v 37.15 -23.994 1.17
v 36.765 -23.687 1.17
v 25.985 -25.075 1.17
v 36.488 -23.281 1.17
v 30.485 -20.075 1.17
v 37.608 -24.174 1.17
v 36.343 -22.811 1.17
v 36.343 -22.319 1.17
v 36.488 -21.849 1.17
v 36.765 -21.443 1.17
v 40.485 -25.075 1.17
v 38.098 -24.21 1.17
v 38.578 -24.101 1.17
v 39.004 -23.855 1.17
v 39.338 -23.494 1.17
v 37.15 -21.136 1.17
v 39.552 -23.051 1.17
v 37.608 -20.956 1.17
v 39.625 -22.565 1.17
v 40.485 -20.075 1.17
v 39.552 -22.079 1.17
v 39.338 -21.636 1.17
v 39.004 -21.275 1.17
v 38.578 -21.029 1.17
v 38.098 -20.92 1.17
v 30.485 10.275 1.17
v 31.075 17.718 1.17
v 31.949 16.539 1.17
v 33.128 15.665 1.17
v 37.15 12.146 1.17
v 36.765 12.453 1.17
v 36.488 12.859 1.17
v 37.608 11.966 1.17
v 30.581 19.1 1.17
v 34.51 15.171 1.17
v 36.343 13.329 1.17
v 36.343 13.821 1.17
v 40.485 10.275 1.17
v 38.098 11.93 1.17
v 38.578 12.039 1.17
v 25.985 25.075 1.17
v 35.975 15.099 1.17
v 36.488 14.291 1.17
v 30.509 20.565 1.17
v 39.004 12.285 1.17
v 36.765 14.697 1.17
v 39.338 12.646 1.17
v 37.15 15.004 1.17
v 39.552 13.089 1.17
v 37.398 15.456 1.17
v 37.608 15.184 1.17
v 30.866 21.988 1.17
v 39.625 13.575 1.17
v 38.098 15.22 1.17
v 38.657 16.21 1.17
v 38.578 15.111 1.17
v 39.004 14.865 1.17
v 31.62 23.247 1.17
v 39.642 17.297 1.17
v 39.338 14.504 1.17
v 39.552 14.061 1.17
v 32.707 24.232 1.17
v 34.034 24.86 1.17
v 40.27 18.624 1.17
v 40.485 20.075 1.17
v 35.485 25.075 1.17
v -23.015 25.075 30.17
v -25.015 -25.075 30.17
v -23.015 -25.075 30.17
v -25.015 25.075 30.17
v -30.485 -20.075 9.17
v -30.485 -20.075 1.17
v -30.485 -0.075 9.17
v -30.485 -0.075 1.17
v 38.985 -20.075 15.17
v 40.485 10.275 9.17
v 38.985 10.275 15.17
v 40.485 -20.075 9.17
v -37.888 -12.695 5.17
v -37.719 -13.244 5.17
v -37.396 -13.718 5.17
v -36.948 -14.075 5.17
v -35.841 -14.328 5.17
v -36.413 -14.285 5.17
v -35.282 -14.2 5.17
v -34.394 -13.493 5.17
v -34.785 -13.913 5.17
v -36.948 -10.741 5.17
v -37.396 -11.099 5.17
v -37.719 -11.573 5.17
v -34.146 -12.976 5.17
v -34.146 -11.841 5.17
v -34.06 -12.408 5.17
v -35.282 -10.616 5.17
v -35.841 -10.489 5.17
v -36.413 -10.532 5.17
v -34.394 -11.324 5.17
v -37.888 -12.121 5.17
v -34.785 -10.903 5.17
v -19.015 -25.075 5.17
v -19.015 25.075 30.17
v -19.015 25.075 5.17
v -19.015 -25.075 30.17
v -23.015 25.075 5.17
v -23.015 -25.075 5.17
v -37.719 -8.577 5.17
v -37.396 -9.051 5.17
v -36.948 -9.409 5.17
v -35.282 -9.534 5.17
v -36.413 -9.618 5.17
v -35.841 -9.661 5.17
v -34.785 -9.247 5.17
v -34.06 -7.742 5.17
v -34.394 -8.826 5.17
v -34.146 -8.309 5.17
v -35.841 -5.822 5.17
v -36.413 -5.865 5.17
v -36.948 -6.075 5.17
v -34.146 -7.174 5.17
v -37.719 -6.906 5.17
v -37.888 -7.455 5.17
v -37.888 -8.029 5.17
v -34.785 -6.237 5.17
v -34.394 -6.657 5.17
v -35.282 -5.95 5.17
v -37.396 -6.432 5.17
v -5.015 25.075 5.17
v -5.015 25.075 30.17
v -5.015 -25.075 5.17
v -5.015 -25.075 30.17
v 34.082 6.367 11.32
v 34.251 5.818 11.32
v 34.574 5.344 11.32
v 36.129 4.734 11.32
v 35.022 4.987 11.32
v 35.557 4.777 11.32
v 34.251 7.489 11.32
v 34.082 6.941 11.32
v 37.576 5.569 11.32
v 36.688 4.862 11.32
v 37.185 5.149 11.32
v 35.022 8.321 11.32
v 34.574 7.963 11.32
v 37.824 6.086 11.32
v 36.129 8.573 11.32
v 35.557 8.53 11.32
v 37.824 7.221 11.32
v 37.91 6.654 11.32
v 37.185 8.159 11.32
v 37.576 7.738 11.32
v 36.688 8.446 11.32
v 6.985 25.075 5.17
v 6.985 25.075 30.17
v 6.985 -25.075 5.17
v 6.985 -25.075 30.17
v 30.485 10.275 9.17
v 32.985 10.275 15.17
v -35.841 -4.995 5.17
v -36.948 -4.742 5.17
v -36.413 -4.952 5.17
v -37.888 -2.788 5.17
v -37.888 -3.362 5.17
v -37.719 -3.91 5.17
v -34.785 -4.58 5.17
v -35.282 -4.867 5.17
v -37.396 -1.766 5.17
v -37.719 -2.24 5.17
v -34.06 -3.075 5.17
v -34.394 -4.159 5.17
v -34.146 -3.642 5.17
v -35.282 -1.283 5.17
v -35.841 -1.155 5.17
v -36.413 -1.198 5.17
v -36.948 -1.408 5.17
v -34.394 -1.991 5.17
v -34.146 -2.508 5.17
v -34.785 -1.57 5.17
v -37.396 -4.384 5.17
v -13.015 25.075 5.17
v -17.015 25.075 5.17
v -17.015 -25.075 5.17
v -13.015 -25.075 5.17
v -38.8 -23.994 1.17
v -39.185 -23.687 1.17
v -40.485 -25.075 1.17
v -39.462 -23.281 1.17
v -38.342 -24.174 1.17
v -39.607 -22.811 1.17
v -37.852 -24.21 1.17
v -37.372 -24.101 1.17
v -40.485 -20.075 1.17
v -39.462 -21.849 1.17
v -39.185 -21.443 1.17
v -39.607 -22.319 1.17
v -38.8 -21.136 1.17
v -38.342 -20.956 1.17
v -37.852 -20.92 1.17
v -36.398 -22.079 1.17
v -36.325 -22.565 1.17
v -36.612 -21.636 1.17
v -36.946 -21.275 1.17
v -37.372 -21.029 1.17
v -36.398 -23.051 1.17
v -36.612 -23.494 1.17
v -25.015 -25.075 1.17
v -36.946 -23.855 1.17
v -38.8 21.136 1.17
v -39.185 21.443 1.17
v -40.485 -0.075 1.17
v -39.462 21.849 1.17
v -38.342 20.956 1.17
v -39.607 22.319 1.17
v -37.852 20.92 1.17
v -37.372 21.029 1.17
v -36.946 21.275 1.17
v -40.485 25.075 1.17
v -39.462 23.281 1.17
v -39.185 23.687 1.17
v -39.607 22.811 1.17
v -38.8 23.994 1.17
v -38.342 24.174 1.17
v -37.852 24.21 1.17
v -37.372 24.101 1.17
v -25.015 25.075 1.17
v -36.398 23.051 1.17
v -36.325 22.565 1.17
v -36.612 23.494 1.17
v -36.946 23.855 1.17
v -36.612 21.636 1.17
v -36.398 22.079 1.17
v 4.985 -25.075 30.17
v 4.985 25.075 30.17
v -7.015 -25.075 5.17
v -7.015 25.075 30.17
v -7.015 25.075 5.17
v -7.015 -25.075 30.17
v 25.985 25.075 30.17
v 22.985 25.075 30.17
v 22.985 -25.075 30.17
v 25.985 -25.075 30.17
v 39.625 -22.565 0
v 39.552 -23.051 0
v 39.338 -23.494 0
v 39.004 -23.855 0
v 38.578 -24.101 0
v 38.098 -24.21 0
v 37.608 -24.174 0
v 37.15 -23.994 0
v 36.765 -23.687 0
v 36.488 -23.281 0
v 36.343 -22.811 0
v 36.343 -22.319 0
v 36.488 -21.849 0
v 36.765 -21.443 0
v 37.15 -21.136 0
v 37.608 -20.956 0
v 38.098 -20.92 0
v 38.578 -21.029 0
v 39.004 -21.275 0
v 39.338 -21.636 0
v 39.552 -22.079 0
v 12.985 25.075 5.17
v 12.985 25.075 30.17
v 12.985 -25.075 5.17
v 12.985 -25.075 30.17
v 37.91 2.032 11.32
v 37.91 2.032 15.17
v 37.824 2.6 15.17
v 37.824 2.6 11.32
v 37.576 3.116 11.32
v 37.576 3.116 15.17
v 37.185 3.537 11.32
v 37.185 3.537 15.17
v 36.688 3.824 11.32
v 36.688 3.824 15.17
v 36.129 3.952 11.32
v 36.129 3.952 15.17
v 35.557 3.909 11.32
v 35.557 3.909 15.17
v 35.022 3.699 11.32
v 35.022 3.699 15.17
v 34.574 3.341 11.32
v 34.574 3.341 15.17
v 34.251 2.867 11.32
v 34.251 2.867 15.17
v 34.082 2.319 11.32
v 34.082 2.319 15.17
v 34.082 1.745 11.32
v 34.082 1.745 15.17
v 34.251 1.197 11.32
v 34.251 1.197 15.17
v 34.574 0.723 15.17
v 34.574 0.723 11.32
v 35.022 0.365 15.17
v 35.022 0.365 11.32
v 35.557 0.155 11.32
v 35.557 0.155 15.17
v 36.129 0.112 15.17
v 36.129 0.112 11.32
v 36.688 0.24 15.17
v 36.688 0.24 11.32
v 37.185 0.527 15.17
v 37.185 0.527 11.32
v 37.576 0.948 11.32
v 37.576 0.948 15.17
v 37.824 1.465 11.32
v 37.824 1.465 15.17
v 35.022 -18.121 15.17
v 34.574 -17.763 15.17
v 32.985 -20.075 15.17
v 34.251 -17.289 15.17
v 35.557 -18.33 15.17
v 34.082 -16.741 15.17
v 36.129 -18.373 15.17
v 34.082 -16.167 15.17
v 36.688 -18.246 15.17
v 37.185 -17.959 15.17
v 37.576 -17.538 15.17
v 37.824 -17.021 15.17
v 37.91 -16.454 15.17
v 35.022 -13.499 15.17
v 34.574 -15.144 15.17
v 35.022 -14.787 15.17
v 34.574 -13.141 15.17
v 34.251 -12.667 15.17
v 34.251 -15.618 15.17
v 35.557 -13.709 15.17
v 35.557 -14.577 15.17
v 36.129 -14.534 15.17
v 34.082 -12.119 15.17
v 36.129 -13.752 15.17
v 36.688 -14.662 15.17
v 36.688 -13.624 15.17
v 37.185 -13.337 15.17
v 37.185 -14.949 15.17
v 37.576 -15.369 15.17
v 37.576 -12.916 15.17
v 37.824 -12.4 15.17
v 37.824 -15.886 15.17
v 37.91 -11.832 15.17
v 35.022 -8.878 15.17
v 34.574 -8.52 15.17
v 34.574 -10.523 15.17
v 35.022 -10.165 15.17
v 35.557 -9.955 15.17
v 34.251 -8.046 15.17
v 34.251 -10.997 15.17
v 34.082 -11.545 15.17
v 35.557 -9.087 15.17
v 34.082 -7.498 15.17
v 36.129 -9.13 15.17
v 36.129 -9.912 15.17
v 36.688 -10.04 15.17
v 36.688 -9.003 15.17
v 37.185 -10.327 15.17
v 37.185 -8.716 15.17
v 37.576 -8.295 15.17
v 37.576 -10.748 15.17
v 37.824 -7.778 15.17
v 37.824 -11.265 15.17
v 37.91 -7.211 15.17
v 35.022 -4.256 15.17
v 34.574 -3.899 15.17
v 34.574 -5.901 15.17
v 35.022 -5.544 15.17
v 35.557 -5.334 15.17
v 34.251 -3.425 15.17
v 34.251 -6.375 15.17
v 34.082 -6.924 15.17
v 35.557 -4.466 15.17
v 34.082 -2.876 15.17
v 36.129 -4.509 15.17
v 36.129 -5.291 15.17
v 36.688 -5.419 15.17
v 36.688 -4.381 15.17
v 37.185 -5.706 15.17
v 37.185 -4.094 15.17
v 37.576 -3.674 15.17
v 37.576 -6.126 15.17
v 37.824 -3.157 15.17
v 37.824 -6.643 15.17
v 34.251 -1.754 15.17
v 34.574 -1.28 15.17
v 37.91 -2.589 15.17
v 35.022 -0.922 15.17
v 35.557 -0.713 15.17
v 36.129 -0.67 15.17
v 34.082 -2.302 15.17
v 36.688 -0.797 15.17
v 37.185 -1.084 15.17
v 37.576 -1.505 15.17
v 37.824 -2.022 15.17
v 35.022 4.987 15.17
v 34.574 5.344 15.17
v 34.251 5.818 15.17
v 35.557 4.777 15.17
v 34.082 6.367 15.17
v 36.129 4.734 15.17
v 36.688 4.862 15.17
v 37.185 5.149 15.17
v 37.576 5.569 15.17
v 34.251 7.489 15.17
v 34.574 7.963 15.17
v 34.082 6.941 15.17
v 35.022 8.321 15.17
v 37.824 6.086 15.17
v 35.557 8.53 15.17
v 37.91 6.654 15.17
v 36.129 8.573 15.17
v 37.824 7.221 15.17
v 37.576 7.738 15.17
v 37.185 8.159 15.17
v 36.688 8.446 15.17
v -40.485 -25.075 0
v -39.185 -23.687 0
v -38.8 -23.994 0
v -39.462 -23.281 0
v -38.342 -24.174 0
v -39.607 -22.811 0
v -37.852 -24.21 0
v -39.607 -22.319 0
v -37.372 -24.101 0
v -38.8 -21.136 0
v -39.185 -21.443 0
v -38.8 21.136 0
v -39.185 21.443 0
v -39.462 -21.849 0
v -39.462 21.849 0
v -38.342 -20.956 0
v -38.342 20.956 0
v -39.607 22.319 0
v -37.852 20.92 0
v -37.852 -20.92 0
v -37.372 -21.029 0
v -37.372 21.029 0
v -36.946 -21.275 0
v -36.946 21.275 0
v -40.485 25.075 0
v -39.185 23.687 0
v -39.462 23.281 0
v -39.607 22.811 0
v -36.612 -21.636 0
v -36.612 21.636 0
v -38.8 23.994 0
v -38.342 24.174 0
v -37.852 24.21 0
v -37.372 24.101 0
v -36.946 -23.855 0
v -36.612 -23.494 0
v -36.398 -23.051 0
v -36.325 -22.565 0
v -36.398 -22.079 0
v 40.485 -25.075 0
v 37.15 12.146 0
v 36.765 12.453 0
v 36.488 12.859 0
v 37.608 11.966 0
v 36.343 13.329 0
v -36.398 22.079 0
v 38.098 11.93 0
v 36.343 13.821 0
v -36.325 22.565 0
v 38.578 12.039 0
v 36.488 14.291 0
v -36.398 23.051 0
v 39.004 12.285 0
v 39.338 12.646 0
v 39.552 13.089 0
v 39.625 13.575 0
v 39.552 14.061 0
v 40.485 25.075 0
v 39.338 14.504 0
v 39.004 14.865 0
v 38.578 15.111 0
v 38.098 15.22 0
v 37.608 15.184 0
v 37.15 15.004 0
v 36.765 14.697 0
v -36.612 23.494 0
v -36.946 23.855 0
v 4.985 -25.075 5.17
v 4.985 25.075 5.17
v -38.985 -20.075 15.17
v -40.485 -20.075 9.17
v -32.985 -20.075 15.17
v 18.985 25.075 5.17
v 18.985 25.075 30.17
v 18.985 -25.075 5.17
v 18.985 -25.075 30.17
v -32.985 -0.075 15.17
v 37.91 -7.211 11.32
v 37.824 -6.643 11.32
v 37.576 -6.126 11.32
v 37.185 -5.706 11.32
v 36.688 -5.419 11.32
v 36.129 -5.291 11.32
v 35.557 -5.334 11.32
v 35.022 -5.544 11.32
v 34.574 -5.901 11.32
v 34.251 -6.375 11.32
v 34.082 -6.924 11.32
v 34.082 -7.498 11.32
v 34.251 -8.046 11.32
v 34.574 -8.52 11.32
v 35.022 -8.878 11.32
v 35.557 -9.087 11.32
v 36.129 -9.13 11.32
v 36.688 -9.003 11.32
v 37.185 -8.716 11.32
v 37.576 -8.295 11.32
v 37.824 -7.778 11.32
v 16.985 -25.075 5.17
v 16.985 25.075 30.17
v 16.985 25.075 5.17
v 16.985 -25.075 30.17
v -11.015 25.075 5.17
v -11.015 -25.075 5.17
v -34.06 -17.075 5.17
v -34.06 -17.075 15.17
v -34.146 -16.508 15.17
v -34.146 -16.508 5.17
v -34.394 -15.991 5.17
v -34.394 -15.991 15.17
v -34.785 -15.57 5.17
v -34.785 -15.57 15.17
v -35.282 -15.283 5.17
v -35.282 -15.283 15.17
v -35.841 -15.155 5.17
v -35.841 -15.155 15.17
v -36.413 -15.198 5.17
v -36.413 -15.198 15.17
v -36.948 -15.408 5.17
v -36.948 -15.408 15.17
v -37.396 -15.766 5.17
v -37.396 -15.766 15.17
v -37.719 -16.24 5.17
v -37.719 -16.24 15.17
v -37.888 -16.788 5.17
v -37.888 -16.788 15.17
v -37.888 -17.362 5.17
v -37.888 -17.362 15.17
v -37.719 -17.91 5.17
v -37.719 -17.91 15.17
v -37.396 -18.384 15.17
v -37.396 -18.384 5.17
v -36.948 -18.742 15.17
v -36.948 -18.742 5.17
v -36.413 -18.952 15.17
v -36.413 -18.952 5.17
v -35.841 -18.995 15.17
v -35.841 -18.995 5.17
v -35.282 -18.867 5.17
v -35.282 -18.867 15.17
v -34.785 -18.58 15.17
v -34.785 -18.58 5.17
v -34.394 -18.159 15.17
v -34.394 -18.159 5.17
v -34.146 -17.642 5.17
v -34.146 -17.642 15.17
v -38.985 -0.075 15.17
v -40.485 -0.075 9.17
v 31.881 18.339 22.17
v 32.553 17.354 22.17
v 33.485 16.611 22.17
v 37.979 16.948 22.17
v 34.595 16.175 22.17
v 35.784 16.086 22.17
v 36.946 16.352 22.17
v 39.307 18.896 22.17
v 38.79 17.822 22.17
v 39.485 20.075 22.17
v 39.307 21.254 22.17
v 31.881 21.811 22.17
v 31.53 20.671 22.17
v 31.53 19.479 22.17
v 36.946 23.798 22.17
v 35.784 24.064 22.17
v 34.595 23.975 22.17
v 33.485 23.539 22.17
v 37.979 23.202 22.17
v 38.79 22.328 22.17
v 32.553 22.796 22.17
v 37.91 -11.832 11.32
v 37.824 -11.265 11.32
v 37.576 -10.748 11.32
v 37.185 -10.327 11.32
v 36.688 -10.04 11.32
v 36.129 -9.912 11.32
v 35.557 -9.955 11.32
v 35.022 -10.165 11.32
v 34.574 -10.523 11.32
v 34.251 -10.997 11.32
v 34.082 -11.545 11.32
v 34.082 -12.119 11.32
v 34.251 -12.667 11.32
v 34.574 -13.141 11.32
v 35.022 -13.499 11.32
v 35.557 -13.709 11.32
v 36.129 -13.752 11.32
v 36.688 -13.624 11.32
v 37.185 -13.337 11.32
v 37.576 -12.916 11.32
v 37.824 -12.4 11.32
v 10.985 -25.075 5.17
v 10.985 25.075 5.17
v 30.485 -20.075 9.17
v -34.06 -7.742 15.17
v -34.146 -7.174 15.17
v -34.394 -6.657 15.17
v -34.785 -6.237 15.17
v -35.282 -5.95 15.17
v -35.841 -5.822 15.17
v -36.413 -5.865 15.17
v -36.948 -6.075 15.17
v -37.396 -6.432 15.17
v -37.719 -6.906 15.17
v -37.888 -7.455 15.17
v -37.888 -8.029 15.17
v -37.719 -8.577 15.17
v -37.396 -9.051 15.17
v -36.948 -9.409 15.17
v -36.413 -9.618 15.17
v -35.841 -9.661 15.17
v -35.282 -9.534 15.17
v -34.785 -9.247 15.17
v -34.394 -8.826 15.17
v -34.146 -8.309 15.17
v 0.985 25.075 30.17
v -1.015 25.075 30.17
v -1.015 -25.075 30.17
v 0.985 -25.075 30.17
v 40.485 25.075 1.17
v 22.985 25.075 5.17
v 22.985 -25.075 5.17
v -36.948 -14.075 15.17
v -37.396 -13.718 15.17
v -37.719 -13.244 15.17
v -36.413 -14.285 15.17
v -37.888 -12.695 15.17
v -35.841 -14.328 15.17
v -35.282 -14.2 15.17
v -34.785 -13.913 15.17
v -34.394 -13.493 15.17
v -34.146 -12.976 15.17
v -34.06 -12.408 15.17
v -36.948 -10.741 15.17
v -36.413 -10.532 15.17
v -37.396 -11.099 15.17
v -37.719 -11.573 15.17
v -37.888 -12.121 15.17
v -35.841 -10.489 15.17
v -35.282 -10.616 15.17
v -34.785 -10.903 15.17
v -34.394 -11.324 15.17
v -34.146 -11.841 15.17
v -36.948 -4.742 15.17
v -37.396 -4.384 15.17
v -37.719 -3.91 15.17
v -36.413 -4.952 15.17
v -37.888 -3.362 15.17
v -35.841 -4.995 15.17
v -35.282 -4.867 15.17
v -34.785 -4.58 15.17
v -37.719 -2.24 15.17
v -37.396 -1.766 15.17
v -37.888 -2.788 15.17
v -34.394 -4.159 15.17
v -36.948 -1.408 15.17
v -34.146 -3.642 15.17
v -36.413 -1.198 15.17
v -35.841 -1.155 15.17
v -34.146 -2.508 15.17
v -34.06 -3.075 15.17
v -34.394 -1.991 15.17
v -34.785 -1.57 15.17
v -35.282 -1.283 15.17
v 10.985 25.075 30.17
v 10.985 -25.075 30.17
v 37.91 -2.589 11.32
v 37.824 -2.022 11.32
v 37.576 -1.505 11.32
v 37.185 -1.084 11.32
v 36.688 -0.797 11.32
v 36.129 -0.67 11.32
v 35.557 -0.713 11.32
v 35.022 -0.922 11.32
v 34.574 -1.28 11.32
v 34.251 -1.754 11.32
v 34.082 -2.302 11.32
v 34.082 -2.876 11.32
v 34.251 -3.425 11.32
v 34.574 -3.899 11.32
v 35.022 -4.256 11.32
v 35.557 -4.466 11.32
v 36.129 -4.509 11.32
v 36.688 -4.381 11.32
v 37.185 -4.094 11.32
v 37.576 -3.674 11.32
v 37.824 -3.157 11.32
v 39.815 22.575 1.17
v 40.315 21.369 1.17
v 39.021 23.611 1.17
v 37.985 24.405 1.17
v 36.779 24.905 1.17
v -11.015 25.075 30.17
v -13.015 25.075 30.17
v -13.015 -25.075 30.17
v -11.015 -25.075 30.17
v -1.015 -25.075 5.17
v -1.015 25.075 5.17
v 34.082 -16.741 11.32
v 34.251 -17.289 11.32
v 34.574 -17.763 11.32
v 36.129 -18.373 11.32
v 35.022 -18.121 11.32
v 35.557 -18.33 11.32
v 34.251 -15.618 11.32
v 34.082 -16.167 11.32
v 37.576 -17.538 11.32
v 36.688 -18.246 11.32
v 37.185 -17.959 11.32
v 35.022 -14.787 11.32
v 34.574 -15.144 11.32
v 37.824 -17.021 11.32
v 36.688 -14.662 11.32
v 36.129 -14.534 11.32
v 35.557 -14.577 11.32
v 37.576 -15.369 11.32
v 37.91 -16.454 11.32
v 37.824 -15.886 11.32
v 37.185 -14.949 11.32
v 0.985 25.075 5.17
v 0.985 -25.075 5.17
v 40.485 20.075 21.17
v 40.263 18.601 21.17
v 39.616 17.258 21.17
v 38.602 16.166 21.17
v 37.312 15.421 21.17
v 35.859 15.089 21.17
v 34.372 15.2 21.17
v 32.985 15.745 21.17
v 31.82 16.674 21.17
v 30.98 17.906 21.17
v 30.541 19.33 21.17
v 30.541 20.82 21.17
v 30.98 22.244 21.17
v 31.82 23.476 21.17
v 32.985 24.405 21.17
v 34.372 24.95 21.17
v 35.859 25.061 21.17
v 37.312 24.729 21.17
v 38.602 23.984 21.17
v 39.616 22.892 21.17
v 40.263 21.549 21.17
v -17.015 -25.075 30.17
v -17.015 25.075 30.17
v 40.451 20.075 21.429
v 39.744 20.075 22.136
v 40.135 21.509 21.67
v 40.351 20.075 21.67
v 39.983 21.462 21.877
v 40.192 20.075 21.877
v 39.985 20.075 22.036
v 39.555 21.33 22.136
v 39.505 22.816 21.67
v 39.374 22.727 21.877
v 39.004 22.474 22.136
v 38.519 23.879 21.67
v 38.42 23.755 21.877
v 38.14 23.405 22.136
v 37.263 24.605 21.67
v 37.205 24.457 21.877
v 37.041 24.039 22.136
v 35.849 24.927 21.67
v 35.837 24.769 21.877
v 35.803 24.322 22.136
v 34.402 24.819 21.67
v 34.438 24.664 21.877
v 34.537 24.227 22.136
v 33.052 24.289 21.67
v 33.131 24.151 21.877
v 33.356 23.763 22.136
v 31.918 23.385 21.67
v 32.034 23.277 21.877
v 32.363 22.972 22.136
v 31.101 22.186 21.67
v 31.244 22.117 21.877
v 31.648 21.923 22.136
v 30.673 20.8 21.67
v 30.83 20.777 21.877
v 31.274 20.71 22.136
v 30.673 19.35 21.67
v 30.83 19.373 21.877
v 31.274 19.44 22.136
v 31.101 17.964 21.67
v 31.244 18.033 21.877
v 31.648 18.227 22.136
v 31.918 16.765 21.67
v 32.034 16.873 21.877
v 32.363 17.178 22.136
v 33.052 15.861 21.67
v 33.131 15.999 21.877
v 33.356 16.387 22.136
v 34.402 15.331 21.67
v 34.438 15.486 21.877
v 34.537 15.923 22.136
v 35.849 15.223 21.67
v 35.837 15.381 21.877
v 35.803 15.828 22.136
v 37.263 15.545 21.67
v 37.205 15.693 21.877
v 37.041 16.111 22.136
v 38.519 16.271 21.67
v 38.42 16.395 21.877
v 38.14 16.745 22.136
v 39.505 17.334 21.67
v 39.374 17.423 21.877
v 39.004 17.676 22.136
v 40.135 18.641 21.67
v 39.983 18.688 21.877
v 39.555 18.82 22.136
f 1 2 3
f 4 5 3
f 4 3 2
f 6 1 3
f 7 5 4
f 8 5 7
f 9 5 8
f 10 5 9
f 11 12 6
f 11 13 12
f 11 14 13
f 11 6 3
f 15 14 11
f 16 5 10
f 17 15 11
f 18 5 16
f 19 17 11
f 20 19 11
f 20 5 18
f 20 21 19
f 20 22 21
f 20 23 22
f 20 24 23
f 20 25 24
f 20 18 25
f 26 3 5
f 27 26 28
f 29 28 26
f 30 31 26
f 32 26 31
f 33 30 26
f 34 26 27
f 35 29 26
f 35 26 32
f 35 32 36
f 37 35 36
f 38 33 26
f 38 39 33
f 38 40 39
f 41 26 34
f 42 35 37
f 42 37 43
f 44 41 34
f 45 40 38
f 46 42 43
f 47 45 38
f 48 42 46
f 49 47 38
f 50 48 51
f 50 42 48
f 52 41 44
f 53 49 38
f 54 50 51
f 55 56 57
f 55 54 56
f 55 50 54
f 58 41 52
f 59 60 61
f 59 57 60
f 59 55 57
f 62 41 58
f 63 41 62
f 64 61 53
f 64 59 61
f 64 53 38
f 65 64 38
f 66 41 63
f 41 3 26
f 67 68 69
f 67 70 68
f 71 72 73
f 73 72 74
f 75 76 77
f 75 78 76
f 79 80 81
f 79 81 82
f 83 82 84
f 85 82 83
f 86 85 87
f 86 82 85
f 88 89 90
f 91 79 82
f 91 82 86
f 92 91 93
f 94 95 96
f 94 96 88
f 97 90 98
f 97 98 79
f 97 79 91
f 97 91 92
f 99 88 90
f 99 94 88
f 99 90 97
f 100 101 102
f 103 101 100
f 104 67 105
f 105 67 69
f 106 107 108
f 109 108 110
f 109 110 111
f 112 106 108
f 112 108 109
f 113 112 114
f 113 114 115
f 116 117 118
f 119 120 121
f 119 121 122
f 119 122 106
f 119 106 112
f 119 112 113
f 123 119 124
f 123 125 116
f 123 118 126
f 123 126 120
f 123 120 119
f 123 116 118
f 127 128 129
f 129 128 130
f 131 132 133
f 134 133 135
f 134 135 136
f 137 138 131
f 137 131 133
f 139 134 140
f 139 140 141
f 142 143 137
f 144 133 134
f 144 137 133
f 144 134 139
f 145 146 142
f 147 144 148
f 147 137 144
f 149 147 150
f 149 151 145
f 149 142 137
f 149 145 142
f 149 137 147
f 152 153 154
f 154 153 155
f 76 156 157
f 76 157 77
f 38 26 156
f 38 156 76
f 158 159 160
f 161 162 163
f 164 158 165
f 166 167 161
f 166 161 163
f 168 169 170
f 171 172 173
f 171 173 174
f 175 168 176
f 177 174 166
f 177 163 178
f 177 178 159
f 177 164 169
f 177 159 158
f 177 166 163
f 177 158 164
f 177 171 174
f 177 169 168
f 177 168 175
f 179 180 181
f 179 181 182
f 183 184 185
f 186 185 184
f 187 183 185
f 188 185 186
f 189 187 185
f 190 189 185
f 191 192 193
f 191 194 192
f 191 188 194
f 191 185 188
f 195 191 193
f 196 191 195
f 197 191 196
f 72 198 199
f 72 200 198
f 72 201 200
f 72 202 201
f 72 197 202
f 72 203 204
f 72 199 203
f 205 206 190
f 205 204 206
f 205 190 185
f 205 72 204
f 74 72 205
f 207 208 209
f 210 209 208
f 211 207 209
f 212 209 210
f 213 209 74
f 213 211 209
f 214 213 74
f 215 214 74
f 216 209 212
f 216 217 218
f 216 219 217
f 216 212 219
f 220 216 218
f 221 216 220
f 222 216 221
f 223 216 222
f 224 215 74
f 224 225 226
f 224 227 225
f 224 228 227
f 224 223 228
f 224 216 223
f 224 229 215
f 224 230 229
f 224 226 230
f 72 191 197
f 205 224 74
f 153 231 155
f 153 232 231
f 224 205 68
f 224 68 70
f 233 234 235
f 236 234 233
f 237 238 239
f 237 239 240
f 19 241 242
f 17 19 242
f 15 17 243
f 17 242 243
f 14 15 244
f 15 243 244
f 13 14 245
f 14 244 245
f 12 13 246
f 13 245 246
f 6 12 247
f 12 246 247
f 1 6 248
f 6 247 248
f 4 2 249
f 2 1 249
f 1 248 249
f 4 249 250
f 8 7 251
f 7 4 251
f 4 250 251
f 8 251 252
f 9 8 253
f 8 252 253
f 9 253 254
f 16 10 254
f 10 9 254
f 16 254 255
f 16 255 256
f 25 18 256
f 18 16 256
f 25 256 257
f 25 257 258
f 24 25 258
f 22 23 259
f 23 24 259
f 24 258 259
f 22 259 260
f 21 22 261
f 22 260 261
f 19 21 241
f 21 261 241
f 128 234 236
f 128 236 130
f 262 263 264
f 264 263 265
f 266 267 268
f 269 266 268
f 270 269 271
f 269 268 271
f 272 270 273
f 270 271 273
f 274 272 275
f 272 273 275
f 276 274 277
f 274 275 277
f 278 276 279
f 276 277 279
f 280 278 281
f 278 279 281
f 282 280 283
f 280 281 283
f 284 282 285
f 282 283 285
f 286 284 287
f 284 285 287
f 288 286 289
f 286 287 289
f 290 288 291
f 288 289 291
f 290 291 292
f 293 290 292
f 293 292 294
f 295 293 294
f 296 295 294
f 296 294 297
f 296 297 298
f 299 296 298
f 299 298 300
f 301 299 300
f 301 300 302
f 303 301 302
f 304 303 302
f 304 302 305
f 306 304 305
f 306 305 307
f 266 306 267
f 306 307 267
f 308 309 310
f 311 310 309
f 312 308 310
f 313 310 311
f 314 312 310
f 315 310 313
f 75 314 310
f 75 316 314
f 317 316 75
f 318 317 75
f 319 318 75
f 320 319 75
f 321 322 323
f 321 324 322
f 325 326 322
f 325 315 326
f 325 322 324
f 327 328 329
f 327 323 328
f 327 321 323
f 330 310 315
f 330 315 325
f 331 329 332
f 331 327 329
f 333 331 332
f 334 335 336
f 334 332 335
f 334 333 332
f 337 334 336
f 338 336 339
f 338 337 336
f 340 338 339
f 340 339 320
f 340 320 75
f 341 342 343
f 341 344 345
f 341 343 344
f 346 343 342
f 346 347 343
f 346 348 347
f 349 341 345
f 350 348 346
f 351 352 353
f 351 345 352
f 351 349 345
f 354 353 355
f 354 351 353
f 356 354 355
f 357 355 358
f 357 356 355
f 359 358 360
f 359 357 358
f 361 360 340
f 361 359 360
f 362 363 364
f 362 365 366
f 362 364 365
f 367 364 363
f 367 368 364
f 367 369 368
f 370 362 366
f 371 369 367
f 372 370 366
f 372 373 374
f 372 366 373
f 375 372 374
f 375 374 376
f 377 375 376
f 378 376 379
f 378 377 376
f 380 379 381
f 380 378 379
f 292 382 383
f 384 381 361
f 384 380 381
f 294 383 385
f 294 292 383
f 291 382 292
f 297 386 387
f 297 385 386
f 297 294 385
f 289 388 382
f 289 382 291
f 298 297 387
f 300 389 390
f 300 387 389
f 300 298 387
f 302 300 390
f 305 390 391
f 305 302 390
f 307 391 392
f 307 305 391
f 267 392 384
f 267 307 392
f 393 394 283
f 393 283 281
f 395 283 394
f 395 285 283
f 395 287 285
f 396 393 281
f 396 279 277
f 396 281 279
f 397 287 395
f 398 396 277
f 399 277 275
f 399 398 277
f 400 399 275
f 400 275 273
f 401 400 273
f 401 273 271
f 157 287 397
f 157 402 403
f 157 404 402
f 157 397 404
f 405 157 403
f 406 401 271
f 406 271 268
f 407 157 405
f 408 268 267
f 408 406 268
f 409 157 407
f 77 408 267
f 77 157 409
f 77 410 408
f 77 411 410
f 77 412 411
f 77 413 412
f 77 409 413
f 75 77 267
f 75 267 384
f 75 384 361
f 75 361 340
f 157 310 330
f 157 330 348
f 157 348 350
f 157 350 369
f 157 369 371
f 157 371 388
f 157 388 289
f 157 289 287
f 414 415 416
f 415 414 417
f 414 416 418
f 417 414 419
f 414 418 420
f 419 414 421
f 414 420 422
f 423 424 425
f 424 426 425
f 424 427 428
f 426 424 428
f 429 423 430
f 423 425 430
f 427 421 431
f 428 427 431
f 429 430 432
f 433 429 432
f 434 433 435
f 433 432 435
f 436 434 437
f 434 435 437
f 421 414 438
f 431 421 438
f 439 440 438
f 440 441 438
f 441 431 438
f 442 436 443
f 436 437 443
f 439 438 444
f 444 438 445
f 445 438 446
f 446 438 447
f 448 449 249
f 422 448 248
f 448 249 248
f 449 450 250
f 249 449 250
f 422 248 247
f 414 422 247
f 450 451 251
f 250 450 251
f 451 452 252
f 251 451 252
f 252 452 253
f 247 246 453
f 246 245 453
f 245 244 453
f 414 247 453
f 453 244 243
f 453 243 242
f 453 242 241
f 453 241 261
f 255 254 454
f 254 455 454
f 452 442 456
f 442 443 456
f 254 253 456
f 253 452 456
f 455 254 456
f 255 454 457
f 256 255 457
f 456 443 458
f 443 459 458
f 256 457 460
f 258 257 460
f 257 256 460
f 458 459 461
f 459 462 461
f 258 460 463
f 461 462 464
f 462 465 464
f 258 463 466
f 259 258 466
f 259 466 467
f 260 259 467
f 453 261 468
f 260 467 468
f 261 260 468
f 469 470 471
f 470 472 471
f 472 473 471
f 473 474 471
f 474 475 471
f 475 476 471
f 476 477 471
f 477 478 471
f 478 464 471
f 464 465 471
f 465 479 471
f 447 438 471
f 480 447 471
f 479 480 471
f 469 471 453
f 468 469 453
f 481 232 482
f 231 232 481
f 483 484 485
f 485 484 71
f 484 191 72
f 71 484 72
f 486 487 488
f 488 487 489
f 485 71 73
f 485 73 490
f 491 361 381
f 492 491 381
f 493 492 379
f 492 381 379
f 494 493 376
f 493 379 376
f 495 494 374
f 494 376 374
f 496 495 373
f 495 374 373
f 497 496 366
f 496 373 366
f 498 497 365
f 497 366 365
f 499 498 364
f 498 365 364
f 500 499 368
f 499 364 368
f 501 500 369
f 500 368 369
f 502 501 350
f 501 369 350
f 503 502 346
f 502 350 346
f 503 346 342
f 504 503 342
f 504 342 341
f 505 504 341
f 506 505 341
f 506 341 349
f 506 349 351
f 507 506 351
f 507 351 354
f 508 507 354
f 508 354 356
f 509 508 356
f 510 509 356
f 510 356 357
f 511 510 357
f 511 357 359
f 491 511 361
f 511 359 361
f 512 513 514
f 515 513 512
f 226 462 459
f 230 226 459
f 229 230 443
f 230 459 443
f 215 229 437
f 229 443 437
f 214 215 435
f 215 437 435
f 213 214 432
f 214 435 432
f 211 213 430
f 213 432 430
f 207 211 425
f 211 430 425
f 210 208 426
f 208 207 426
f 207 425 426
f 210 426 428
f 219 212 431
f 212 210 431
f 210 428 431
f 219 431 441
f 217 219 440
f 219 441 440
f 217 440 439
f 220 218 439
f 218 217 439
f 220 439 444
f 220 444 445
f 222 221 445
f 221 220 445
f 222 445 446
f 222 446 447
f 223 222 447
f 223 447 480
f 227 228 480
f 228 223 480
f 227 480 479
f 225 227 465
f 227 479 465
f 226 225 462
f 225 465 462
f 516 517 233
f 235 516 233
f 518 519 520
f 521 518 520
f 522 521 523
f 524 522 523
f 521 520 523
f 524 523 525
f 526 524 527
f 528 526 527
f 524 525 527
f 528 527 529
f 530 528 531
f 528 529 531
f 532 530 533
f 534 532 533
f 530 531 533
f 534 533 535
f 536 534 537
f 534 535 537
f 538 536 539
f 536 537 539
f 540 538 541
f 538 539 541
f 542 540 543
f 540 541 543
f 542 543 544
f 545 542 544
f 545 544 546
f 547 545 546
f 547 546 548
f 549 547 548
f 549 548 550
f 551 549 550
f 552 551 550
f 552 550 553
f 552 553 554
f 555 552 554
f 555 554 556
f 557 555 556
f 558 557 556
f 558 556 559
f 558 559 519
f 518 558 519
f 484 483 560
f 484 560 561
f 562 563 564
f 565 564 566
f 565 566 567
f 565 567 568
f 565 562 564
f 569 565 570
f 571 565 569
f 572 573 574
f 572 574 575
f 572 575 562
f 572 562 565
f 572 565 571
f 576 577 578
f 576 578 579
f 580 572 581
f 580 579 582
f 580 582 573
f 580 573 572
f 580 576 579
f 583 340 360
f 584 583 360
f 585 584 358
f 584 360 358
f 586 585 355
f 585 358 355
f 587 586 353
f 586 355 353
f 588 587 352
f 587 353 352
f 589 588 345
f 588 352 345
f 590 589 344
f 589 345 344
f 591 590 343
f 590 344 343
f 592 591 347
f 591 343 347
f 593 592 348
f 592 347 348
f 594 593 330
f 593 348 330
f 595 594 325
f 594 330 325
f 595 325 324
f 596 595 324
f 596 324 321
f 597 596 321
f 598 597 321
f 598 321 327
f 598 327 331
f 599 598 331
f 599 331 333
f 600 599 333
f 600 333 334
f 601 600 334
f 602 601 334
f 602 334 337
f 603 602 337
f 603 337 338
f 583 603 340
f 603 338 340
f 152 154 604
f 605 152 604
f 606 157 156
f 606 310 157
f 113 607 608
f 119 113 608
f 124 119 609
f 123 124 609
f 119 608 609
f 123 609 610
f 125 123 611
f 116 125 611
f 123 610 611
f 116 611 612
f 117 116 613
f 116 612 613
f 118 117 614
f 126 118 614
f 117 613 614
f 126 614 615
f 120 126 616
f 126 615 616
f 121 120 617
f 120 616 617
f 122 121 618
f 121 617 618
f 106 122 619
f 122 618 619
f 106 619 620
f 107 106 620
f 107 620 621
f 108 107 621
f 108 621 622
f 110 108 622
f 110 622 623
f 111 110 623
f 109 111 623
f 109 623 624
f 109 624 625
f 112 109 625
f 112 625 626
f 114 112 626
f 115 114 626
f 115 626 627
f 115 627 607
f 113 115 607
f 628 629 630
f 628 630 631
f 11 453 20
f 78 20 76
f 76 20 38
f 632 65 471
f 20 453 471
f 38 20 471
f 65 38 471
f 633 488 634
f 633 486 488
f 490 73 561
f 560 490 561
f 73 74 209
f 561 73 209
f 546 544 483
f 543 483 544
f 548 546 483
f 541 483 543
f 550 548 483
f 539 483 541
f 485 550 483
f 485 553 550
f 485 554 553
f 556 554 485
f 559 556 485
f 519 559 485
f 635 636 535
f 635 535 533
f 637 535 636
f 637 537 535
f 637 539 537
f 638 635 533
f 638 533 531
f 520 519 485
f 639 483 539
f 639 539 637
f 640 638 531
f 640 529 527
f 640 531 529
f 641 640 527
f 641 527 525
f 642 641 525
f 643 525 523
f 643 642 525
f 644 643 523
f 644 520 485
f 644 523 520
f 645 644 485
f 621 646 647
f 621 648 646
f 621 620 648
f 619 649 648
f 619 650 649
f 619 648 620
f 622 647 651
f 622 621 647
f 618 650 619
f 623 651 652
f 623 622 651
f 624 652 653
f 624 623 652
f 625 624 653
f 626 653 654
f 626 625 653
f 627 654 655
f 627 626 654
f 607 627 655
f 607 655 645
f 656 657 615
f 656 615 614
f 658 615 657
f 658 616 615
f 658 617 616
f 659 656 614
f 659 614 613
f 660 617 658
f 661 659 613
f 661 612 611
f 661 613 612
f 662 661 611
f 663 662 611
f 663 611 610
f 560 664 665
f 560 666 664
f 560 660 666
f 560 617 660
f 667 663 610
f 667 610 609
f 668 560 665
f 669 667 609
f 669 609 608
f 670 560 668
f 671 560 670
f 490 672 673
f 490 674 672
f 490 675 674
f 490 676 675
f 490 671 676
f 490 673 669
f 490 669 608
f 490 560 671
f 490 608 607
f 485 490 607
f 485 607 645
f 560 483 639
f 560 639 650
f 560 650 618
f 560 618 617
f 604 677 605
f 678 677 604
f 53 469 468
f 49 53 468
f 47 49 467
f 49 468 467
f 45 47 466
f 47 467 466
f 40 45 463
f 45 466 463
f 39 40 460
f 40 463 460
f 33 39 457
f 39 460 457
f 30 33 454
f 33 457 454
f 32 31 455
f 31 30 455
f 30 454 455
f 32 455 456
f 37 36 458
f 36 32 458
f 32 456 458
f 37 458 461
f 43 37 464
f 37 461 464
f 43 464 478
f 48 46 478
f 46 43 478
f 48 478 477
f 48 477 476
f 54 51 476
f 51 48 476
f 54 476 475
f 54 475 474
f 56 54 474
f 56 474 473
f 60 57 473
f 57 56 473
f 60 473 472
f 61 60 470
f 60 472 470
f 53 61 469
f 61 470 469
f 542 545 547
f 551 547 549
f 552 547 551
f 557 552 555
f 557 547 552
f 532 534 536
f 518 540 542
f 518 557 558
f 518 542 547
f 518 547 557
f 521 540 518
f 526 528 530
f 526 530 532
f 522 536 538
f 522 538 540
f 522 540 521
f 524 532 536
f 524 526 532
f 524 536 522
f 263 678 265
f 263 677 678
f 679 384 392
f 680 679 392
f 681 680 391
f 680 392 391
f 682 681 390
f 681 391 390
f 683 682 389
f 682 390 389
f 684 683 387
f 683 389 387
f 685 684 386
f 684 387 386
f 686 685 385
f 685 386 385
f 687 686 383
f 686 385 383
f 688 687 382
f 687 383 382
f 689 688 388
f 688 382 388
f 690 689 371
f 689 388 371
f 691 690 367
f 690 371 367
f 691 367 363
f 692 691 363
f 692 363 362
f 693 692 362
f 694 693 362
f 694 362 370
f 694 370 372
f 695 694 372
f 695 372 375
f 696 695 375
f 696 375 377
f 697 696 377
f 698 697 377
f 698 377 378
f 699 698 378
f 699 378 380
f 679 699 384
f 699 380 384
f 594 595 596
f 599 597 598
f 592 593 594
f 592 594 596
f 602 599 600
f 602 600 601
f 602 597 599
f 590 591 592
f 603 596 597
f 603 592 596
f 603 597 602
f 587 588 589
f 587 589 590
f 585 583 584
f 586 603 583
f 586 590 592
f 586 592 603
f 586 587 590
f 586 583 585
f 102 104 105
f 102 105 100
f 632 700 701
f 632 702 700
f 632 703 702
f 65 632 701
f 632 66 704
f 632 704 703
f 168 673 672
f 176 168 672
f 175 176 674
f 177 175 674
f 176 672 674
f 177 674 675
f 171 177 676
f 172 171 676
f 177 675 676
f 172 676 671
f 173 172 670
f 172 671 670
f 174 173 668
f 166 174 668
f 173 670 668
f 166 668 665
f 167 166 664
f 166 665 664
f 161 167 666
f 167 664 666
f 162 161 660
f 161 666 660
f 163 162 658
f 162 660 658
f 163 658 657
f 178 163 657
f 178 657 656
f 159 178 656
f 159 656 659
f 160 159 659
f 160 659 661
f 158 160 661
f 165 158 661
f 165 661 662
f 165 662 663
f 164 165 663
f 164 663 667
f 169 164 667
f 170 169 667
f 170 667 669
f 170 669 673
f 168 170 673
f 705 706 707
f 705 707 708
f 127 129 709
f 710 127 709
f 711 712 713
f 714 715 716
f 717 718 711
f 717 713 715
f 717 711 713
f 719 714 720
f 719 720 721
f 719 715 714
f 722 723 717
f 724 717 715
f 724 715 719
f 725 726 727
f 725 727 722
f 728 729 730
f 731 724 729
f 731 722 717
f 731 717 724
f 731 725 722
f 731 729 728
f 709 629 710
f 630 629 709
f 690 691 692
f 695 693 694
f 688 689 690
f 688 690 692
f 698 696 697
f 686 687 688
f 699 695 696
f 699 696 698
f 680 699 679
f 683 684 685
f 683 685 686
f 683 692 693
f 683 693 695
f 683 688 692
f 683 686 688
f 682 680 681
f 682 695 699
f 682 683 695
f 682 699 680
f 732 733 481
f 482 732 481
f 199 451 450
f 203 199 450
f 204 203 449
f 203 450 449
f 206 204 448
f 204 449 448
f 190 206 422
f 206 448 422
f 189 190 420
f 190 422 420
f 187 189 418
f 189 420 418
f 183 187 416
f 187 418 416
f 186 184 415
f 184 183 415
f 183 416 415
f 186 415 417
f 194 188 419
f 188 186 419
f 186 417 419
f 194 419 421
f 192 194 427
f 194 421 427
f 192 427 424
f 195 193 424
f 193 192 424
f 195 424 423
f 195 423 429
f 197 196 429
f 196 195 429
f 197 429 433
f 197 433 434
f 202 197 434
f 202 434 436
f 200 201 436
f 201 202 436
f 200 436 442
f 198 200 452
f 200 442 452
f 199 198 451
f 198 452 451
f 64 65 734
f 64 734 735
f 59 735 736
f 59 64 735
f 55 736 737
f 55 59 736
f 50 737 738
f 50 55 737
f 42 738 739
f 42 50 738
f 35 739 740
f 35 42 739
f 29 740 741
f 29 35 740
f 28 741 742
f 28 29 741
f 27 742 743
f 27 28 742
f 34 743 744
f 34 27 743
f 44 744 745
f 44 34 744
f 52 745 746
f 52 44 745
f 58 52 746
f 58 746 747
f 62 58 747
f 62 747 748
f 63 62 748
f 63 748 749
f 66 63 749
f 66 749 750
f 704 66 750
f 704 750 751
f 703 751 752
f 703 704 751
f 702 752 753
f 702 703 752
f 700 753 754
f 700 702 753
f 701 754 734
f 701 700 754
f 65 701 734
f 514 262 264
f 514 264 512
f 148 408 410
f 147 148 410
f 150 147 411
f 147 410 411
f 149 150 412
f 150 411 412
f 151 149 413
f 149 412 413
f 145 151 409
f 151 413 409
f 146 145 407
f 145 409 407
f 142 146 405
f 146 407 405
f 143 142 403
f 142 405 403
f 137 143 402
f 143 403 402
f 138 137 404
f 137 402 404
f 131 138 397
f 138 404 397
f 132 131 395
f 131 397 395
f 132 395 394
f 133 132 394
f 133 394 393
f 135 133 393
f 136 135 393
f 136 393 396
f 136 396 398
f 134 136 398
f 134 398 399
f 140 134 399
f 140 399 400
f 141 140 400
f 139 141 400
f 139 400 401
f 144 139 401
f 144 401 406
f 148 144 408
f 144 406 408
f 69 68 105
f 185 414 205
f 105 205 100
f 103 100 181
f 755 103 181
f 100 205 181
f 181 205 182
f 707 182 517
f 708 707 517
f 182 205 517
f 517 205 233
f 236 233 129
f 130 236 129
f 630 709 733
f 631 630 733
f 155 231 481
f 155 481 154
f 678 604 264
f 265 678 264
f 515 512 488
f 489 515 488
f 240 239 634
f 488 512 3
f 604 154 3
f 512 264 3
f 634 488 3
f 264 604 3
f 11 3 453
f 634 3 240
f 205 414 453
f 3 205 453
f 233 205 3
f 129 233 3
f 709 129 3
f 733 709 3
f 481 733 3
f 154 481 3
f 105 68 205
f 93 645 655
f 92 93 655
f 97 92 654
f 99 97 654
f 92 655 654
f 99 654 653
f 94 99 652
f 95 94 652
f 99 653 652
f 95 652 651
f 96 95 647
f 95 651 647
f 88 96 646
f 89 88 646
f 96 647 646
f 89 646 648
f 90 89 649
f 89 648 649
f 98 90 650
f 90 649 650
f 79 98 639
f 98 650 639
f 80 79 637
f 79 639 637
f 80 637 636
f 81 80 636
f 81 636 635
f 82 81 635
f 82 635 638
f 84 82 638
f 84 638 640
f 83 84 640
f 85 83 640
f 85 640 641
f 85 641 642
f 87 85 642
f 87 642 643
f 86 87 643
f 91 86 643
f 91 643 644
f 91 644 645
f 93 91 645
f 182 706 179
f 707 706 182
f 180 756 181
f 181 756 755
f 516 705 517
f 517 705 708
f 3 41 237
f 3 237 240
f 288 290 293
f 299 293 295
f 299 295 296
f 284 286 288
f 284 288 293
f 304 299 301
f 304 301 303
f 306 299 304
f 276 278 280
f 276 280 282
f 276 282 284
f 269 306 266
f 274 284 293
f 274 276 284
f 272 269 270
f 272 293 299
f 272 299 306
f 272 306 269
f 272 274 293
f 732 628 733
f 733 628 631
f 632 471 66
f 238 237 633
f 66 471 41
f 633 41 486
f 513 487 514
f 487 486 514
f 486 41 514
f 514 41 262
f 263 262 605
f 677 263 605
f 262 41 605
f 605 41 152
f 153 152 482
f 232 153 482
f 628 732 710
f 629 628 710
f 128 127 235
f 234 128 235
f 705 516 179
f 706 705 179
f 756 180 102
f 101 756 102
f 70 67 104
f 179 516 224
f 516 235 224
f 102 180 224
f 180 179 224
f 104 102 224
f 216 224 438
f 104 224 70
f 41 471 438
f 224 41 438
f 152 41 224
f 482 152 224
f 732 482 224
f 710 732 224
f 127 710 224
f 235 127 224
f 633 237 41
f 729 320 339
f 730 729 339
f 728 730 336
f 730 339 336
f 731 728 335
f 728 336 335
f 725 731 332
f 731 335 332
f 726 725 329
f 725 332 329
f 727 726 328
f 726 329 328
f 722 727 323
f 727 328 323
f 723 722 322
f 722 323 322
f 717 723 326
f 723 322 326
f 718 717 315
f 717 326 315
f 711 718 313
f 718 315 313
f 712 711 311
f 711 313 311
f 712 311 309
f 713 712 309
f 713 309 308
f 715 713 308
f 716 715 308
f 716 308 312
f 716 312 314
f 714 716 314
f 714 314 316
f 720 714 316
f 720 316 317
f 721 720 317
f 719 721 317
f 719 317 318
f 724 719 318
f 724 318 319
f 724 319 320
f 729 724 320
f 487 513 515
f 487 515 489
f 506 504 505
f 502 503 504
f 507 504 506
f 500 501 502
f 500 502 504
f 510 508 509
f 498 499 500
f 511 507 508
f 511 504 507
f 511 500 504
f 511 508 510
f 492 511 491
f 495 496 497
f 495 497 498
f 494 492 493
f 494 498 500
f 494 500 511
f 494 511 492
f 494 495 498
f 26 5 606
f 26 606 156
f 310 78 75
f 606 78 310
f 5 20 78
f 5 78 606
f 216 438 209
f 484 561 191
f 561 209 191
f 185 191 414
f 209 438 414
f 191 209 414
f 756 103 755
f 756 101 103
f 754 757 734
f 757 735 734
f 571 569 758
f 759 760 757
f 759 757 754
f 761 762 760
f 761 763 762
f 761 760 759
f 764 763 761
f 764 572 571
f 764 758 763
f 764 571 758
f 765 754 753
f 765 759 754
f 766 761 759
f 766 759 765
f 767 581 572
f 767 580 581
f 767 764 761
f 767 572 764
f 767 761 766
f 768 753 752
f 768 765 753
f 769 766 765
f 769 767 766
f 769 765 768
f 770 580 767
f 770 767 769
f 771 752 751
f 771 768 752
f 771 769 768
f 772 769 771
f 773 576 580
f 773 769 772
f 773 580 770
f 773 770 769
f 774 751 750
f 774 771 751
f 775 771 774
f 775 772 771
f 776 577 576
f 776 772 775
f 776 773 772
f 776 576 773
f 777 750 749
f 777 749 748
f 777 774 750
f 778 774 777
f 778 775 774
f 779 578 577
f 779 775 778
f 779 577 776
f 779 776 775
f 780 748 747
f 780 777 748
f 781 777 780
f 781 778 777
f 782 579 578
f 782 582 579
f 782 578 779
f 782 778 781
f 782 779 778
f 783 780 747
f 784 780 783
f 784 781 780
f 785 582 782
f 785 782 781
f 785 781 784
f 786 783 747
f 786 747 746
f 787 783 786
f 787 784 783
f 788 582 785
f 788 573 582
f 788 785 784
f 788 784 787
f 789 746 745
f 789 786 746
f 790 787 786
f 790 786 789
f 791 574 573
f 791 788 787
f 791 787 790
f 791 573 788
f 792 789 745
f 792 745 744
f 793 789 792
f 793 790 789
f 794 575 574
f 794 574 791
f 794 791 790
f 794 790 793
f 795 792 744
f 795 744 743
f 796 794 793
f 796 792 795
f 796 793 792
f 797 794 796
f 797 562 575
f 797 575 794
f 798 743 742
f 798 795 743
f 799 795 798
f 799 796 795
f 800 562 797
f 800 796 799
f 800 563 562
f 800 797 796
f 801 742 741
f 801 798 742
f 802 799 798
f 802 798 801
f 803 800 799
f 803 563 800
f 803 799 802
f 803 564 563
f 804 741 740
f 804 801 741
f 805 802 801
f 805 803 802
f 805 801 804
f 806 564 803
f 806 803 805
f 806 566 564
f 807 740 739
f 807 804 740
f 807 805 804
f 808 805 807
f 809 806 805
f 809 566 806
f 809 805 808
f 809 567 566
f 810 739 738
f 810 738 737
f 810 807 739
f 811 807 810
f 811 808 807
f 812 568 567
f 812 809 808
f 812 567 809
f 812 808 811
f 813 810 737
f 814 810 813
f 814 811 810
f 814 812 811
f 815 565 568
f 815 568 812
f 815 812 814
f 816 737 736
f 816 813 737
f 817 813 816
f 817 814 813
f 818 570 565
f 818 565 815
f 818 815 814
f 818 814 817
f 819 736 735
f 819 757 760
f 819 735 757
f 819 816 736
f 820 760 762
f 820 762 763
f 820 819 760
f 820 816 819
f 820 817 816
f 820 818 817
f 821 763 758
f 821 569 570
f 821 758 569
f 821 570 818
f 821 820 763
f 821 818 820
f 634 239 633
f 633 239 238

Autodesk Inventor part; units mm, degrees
ref_plane "YZ Plane" through (0, 0, 0) normal (1, 0, 0) x (0, 1, 0)
ref_plane "XZ Plane" through (0, 0, 0) normal (0, 1, 0) x (-1, 0, 0)
ref_plane "XY Plane" through (0, 0, 0) normal (0, 0, 1) x (1, 0, 0)
sketch "Sketch1" plane through (0, 0, 0) normal (0, 0, 1) x (1, 0, 0)
  line L0 (-40.485, -25.075) -> (40.485, -25.075)
  line L1 (40.485, -25.075) -> (40.485, 25.075)
  line L2 (40.485, 25.075) -> (-40.485, 25.075)
  line L3 (-40.485, 25.075) -> (-40.485, -25.075)
  line L4 (-40.485, -25.075) -> (40.485, 25.075) construction
  line L5 (40.485, -25.075) -> (-40.485, 25.075) construction
  circle A0 centre (-37.975, 22.565) radius 1.65
  line L6 (-39.625, 24.215) -> (-36.325, 24.215) construction
  line L7 (-36.325, 24.215) -> (-36.325, 20.915) construction
  line L8 (-36.325, 20.915) -> (-39.625, 20.915) construction
  line L9 (-39.625, 20.915) -> (-39.625, 24.215) construction
  line L10 (-39.625, 24.215) -> (-36.325, 20.915) construction
  line L11 (-36.325, 24.215) -> (-39.625, 20.915) construction
  line L12 (-40.485, 0) -> (40.485, 0) construction
  line L13 (0, 25.075) -> (0, -25.075) construction
  circle A1 centre (-37.975, -22.565) radius 1.65
  line L14 (0, -25.075) -> (0, 25.075) construction
  circle A2 centre (37.975, 22.565) radius 1.65 construction
  circle A3 centre (37.975, -22.565) radius 1.65
  line L15 (37.975, 25.075) -> (37.975, 13.575) construction
  circle A4 centre (37.975, 13.575) radius 1.65
  point P0 (0, 0)
  dimension "d0" = 80.97
  dimension "d1" = 50.15
  dimension "d2" = 3.3
  dimension "d3" = 0.86
  dimension "d4" = 0.86
  dimension "d10" = 11.5
extrude "Extrusion1" add sketch "Sketch1" along normal blind 1.17
sketch "Sketch2" plane through (0, 0, 1.17) normal (0, 0, 1) x (1, 0, 0)
  line L0 (40.485, -25.075) -> (40.485, 25.075) projected
  line L1 (40.485, -20.075) -> (30.485, -20.075)
  line L2 (30.485, -20.075) -> (30.485, 10.275)
  line L3 (30.485, 10.275) -> (40.485, 10.275)
  line L4 (40.485, 10.275) -> (40.485, -20.075)
  line L5 (-40.485, -25.075) -> (40.485, -25.075) projected
  point P0 (0, 0)
  dimension "d7" = 5
  dimension "d8" = 30.35
  dimension "d9" = 10
extrude "Extrusion2" add sketch "Sketch2" along normal blind 14
sketch "Sketch3" plane through (0, 0, 1.17) normal (0, 0, 1) x (1, 0, 0)
  line L0 (40.485, 10.275) -> (40.485, 25.075) construction
  line L1 (40.485, 25.075) -> (-40.485, 25.075) construction
  circle A0 centre (35.485, 20.075) radius 5
  point P0 (0, 0)
  dimension "d13" = 10
extrude "Extrusion3" add sketch "Sketch3" along normal blind 21
fillet "Fillet1" radius 1 1 edges at (30.485, 20.075, 22.17)
sketch "Sketch4" plane through (30.485, -20.075, 1.17) normal (0, -1, 0) x (1, 0, 0)
  line L0 (0, 14) -> (10, 14) construction
  line L1 (0, 0) -> (0, 14) projected
  line L2 (10, 0) -> (10, 14) projected
  line L3 (10, 14) -> (0, 14) projected
  line L4 (2.5, 14) -> (8.5, 14)
  line L5 (10, 8) -> (8.5, 14)
  line L6 (2.5, 14) -> (0, 8)
  line L7 (10, 8) -> (0, 8) construction
  point P0 (-30.485, -1.17)
  dimension "d17" = 6
  dimension "d18" = 6
  dimension "d19" = 1.5
extrude "Extrusion4" cut sketch "Sketch4" against normal up to surface (30.35 mm away)
sketch "Sketch5" plane through (0, 0, 15.17) normal (0, 0, 1) x (1, 0, 0)
  line L0 (38.985, 10.275) -> (32.985, 10.275) construction
  line L1 (35.985, 10.275) -> (35.985, -20.075) construction
  line L2 (32.985, -20.075) -> (38.985, -20.075) construction
  line L3 (35.985, -20.075) -> (35.985, 10.275) construction
  circle A0 centre (35.985, 6.6536) radius 1.925
  circle A1 centre (35.985, 2.0321) radius 1.925
  circle A2 centre (35.985, -2.5893) radius 1.925
  circle A3 centre (35.985, -7.2107) radius 1.925
  circle A4 centre (35.985, -11.8321) radius 1.925
  circle A5 centre (35.985, -16.4536) radius 1.925
  point P0 (0, 0)
  dimension "d22" = 3.85
  dimension "d23" = 4.6214
  dimension "d24" = 4.6214
  dimension "d25" = 4.6214
  dimension "d26" = 4.6214
  dimension "d27" = 4.6214
  dimension "d28" = 3.6214
  dimension "d29" = 3.6214
extrude "Extrusion5" cut sketch "Sketch5" against normal blind 3.85
sketch "Sketch6" plane through (0, 0, 1.17) normal (0, 0, 1) x (1, 0, 0)
  line L0 (-25.015, 25.075) -> (25.985, 25.075)
  line L1 (25.985, 25.075) -> (25.985, -25.075)
  line L2 (25.985, -25.075) -> (-25.015, -25.075)
  line L3 (-25.015, -25.075) -> (-25.015, 25.075)
  line L4 (40.485, -25.075) -> (40.485, -20.075) projected
  line L5 (35.485, 25.075) -> (-40.485, 25.075) projected
  line L6 (-40.485, -25.075) -> (40.485, -25.075) projected
  point P0 (0, 0)
  dimension "d32" = 14.5
  dimension "d33" = 51
extrude "Extrusion6" add sketch "Sketch6" along normal blind 29
sketch "Sketch7" plane through (0, 0, 30.17) normal (0, 0, 1) x (1, 0, 0)
  line L0 (25.985, 25.075) -> (-25.015, 25.075) projected
  line L1 (-25.015, -25.075) -> (25.985, -25.075) projected
  line L2 (22.985, 25.075) -> (18.985, 25.075)
  line L3 (18.985, 25.075) -> (18.985, -25.075)
  line L4 (18.985, -25.075) -> (22.985, -25.075)
  line L5 (22.985, -25.075) -> (22.985, 25.075)
  line L6 (25.985, -25.075) -> (25.985, 25.075) projected
  line L7 (16.985, 25.075) -> (16.985, -25.075)
  line L8 (12.985, 25.075) -> (12.985, -25.075)
  line L9 (10.985, 25.075) -> (10.985, -25.075)
  line L10 (6.985, 25.075) -> (6.985, -25.075)
  line L11 (4.985, 25.075) -> (4.985, -25.075)
  line L12 (0.985, 25.075) -> (0.985, -25.075)
  line L13 (-1.015, 25.075) -> (-1.015, -25.075)
  line L14 (-5.015, 25.075) -> (-5.015, -25.075)
  line L15 (-7.015, 25.075) -> (-7.015, -25.075)
  line L16 (-11.015, 25.075) -> (-11.015, -25.075)
  line L17 (-13.015, 25.075) -> (-13.015, -25.075)
  line L18 (-17.015, 25.075) -> (-17.015, -25.075)
  line L19 (-19.015, 25.075) -> (-19.015, -25.075)
  line L20 (-23.015, 25.075) -> (-23.015, -25.075)
  point P0 (0, 0)
  dimension "d36" = 3
  dimension "d37" = 4
  dimension "d38" = 2
  dimension "d39" = 4
  dimension "d40" = 2
  dimension "d41" = 4
  dimension "d42" = 2
  dimension "d43" = 4
  dimension "d44" = 2
  dimension "d45" = 4
  dimension "d46" = 2
  dimension "d47" = 4
  dimension "d48" = 2
  dimension "d49" = 4
  dimension "d50" = 2
  dimension "d51" = 4
extrude "Extrusion7" cut sketch "Sketch7" against normal blind 25 contours L5 L1 L3 L0 | L7 L1 L8 L0 | L9 L1 L10 L0 | L11 L1 L12 L0 | L13 L1 L14 L0 | L15 L1 L16 L0 | L17 L1 L18 L0 | L19 L1 L20 L0
sketch "Sketch8" plane through (0, 0, 1.17) normal (0, 0, 1) x (1, 0, 0)
  line L0 (32.985, -20.075) -> (38.985, -20.075) projected
  line L1 (30.485, -20.075) -> (-40.485, -20.075) construction
  line L2 (-40.485, 25.075) -> (-40.485, -25.075) projected
  line L3 (-40.485, -20.075) -> (-30.485, -20.075)
  line L4 (-30.485, -20.075) -> (-30.485, -0.075)
  line L5 (-30.485, -0.075) -> (-40.485, -0.075)
  line L6 (-40.485, -0.075) -> (-40.485, -20.075)
  line L7 (40.485, 10.275) -> (40.485, -20.075) projected
  line L8 (30.485, -20.075) -> (30.485, 10.275) projected
  point P0 (0, 0)
  point P1 (-30.485, -10.075)
  dimension "d54" = 20
  dimension "d55" = 10
  dimension "d56" = 10
extrude "Extrusion8" add sketch "Sketch8" along normal up to surface (14 mm away)
sketch "Sketch10" plane through (-40.485, -20.075, 1.17) normal (0, -1, 0) x (1, 0, 0)
  line L0 (10, 14) -> (0, 14) projected
  line L1 (2.6888, 14) -> (7.5, 14)
  line L2 (10, 0) -> (10, 14) projected
  line L3 (10, 8) -> (7.5, 14)
  line L4 (0, 0) -> (0, 14) projected
  line L5 (1.5, 14) -> (0, 8)
  line L6 (73.47, 14) -> (79.47, 14) projected
  line L7 (80.97, 8) -> (79.47, 14) projected
  line L8 (73.47, 14) -> (70.97, 8) projected
  point P0 (40.485, -1.17)
  point P1 (76.47, 14)
  dimension "d59" = 1.5
  dimension "d60" = 1.5
  dimension "d61" = 2.5
  dimension "d62" = 2.5
  dimension "d63" = 6
  dimension "d64" = 6
  dimension "d65" = 6
extrude "Extrusion9" cut sketch "Sketch10" against normal up to surface (20 mm away)
sketch "Sketch11" plane through (-38.985, -0.075, 15.17) normal (0, 0, 1) x (1, 0, 0)
  line L0 (0, 0) -> (6, 0) construction
  line L1 (6, -20) -> (0, -20) construction
  line L2 (3, 0) -> (3, -20) construction
  circle A0 centre (3, -3) radius 1.925
  circle A1 centre (3, -7.6667) radius 1.925
  circle A2 centre (3, -12.3333) radius 1.925
  circle A3 centre (3, -17) radius 1.925
  circle A4 centre (74.97, 6.7286) radius 1.925 projected
  point P0 (38.985, 0.075)
  dimension "d68" = 3
  dimension "d69" = 3
  dimension "d70" = 4.6667
  dimension "d71" = 4.6667
  dimension "d73" = 4.6667
extrude "Extrusion10" cut sketch "Sketch11" against normal blind 10 contours A0 | A1 | A2 | A3
equation "\"d24\" = d23"
equation "\"d25\" = d23"
equation "\"d26\" = d23"
equation "\"d27\" = d23"
equation "\"d30\" = d22"
equation "\"d39\" = d37"
equation "\"d40\" = d38"
equation "\"d41\" = d37"
equation "\"d42\" = d38"
equation "\"d43\" = d37"
equation "\"d44\" = d38"
equation "\"d45\" = d37"
equation "\"d46\" = d38"
equation "\"d47\" = d37"
equation "\"d48\" = d38"
equation "\"d49\" = d37"
equation "\"d50\" = d38"
equation "\"d51\" = d37"
equation "\"d56\" = d55"
equation "\"d60\" = d59"
equation "\"d62\" = d61"
equation "\"d64\" = d63"
equation "\"d65\" = d63"
equation "\"d71\" = d70"
equation "\"d73\" = d70"
properties part number "HiLetgoTB6600HG"
